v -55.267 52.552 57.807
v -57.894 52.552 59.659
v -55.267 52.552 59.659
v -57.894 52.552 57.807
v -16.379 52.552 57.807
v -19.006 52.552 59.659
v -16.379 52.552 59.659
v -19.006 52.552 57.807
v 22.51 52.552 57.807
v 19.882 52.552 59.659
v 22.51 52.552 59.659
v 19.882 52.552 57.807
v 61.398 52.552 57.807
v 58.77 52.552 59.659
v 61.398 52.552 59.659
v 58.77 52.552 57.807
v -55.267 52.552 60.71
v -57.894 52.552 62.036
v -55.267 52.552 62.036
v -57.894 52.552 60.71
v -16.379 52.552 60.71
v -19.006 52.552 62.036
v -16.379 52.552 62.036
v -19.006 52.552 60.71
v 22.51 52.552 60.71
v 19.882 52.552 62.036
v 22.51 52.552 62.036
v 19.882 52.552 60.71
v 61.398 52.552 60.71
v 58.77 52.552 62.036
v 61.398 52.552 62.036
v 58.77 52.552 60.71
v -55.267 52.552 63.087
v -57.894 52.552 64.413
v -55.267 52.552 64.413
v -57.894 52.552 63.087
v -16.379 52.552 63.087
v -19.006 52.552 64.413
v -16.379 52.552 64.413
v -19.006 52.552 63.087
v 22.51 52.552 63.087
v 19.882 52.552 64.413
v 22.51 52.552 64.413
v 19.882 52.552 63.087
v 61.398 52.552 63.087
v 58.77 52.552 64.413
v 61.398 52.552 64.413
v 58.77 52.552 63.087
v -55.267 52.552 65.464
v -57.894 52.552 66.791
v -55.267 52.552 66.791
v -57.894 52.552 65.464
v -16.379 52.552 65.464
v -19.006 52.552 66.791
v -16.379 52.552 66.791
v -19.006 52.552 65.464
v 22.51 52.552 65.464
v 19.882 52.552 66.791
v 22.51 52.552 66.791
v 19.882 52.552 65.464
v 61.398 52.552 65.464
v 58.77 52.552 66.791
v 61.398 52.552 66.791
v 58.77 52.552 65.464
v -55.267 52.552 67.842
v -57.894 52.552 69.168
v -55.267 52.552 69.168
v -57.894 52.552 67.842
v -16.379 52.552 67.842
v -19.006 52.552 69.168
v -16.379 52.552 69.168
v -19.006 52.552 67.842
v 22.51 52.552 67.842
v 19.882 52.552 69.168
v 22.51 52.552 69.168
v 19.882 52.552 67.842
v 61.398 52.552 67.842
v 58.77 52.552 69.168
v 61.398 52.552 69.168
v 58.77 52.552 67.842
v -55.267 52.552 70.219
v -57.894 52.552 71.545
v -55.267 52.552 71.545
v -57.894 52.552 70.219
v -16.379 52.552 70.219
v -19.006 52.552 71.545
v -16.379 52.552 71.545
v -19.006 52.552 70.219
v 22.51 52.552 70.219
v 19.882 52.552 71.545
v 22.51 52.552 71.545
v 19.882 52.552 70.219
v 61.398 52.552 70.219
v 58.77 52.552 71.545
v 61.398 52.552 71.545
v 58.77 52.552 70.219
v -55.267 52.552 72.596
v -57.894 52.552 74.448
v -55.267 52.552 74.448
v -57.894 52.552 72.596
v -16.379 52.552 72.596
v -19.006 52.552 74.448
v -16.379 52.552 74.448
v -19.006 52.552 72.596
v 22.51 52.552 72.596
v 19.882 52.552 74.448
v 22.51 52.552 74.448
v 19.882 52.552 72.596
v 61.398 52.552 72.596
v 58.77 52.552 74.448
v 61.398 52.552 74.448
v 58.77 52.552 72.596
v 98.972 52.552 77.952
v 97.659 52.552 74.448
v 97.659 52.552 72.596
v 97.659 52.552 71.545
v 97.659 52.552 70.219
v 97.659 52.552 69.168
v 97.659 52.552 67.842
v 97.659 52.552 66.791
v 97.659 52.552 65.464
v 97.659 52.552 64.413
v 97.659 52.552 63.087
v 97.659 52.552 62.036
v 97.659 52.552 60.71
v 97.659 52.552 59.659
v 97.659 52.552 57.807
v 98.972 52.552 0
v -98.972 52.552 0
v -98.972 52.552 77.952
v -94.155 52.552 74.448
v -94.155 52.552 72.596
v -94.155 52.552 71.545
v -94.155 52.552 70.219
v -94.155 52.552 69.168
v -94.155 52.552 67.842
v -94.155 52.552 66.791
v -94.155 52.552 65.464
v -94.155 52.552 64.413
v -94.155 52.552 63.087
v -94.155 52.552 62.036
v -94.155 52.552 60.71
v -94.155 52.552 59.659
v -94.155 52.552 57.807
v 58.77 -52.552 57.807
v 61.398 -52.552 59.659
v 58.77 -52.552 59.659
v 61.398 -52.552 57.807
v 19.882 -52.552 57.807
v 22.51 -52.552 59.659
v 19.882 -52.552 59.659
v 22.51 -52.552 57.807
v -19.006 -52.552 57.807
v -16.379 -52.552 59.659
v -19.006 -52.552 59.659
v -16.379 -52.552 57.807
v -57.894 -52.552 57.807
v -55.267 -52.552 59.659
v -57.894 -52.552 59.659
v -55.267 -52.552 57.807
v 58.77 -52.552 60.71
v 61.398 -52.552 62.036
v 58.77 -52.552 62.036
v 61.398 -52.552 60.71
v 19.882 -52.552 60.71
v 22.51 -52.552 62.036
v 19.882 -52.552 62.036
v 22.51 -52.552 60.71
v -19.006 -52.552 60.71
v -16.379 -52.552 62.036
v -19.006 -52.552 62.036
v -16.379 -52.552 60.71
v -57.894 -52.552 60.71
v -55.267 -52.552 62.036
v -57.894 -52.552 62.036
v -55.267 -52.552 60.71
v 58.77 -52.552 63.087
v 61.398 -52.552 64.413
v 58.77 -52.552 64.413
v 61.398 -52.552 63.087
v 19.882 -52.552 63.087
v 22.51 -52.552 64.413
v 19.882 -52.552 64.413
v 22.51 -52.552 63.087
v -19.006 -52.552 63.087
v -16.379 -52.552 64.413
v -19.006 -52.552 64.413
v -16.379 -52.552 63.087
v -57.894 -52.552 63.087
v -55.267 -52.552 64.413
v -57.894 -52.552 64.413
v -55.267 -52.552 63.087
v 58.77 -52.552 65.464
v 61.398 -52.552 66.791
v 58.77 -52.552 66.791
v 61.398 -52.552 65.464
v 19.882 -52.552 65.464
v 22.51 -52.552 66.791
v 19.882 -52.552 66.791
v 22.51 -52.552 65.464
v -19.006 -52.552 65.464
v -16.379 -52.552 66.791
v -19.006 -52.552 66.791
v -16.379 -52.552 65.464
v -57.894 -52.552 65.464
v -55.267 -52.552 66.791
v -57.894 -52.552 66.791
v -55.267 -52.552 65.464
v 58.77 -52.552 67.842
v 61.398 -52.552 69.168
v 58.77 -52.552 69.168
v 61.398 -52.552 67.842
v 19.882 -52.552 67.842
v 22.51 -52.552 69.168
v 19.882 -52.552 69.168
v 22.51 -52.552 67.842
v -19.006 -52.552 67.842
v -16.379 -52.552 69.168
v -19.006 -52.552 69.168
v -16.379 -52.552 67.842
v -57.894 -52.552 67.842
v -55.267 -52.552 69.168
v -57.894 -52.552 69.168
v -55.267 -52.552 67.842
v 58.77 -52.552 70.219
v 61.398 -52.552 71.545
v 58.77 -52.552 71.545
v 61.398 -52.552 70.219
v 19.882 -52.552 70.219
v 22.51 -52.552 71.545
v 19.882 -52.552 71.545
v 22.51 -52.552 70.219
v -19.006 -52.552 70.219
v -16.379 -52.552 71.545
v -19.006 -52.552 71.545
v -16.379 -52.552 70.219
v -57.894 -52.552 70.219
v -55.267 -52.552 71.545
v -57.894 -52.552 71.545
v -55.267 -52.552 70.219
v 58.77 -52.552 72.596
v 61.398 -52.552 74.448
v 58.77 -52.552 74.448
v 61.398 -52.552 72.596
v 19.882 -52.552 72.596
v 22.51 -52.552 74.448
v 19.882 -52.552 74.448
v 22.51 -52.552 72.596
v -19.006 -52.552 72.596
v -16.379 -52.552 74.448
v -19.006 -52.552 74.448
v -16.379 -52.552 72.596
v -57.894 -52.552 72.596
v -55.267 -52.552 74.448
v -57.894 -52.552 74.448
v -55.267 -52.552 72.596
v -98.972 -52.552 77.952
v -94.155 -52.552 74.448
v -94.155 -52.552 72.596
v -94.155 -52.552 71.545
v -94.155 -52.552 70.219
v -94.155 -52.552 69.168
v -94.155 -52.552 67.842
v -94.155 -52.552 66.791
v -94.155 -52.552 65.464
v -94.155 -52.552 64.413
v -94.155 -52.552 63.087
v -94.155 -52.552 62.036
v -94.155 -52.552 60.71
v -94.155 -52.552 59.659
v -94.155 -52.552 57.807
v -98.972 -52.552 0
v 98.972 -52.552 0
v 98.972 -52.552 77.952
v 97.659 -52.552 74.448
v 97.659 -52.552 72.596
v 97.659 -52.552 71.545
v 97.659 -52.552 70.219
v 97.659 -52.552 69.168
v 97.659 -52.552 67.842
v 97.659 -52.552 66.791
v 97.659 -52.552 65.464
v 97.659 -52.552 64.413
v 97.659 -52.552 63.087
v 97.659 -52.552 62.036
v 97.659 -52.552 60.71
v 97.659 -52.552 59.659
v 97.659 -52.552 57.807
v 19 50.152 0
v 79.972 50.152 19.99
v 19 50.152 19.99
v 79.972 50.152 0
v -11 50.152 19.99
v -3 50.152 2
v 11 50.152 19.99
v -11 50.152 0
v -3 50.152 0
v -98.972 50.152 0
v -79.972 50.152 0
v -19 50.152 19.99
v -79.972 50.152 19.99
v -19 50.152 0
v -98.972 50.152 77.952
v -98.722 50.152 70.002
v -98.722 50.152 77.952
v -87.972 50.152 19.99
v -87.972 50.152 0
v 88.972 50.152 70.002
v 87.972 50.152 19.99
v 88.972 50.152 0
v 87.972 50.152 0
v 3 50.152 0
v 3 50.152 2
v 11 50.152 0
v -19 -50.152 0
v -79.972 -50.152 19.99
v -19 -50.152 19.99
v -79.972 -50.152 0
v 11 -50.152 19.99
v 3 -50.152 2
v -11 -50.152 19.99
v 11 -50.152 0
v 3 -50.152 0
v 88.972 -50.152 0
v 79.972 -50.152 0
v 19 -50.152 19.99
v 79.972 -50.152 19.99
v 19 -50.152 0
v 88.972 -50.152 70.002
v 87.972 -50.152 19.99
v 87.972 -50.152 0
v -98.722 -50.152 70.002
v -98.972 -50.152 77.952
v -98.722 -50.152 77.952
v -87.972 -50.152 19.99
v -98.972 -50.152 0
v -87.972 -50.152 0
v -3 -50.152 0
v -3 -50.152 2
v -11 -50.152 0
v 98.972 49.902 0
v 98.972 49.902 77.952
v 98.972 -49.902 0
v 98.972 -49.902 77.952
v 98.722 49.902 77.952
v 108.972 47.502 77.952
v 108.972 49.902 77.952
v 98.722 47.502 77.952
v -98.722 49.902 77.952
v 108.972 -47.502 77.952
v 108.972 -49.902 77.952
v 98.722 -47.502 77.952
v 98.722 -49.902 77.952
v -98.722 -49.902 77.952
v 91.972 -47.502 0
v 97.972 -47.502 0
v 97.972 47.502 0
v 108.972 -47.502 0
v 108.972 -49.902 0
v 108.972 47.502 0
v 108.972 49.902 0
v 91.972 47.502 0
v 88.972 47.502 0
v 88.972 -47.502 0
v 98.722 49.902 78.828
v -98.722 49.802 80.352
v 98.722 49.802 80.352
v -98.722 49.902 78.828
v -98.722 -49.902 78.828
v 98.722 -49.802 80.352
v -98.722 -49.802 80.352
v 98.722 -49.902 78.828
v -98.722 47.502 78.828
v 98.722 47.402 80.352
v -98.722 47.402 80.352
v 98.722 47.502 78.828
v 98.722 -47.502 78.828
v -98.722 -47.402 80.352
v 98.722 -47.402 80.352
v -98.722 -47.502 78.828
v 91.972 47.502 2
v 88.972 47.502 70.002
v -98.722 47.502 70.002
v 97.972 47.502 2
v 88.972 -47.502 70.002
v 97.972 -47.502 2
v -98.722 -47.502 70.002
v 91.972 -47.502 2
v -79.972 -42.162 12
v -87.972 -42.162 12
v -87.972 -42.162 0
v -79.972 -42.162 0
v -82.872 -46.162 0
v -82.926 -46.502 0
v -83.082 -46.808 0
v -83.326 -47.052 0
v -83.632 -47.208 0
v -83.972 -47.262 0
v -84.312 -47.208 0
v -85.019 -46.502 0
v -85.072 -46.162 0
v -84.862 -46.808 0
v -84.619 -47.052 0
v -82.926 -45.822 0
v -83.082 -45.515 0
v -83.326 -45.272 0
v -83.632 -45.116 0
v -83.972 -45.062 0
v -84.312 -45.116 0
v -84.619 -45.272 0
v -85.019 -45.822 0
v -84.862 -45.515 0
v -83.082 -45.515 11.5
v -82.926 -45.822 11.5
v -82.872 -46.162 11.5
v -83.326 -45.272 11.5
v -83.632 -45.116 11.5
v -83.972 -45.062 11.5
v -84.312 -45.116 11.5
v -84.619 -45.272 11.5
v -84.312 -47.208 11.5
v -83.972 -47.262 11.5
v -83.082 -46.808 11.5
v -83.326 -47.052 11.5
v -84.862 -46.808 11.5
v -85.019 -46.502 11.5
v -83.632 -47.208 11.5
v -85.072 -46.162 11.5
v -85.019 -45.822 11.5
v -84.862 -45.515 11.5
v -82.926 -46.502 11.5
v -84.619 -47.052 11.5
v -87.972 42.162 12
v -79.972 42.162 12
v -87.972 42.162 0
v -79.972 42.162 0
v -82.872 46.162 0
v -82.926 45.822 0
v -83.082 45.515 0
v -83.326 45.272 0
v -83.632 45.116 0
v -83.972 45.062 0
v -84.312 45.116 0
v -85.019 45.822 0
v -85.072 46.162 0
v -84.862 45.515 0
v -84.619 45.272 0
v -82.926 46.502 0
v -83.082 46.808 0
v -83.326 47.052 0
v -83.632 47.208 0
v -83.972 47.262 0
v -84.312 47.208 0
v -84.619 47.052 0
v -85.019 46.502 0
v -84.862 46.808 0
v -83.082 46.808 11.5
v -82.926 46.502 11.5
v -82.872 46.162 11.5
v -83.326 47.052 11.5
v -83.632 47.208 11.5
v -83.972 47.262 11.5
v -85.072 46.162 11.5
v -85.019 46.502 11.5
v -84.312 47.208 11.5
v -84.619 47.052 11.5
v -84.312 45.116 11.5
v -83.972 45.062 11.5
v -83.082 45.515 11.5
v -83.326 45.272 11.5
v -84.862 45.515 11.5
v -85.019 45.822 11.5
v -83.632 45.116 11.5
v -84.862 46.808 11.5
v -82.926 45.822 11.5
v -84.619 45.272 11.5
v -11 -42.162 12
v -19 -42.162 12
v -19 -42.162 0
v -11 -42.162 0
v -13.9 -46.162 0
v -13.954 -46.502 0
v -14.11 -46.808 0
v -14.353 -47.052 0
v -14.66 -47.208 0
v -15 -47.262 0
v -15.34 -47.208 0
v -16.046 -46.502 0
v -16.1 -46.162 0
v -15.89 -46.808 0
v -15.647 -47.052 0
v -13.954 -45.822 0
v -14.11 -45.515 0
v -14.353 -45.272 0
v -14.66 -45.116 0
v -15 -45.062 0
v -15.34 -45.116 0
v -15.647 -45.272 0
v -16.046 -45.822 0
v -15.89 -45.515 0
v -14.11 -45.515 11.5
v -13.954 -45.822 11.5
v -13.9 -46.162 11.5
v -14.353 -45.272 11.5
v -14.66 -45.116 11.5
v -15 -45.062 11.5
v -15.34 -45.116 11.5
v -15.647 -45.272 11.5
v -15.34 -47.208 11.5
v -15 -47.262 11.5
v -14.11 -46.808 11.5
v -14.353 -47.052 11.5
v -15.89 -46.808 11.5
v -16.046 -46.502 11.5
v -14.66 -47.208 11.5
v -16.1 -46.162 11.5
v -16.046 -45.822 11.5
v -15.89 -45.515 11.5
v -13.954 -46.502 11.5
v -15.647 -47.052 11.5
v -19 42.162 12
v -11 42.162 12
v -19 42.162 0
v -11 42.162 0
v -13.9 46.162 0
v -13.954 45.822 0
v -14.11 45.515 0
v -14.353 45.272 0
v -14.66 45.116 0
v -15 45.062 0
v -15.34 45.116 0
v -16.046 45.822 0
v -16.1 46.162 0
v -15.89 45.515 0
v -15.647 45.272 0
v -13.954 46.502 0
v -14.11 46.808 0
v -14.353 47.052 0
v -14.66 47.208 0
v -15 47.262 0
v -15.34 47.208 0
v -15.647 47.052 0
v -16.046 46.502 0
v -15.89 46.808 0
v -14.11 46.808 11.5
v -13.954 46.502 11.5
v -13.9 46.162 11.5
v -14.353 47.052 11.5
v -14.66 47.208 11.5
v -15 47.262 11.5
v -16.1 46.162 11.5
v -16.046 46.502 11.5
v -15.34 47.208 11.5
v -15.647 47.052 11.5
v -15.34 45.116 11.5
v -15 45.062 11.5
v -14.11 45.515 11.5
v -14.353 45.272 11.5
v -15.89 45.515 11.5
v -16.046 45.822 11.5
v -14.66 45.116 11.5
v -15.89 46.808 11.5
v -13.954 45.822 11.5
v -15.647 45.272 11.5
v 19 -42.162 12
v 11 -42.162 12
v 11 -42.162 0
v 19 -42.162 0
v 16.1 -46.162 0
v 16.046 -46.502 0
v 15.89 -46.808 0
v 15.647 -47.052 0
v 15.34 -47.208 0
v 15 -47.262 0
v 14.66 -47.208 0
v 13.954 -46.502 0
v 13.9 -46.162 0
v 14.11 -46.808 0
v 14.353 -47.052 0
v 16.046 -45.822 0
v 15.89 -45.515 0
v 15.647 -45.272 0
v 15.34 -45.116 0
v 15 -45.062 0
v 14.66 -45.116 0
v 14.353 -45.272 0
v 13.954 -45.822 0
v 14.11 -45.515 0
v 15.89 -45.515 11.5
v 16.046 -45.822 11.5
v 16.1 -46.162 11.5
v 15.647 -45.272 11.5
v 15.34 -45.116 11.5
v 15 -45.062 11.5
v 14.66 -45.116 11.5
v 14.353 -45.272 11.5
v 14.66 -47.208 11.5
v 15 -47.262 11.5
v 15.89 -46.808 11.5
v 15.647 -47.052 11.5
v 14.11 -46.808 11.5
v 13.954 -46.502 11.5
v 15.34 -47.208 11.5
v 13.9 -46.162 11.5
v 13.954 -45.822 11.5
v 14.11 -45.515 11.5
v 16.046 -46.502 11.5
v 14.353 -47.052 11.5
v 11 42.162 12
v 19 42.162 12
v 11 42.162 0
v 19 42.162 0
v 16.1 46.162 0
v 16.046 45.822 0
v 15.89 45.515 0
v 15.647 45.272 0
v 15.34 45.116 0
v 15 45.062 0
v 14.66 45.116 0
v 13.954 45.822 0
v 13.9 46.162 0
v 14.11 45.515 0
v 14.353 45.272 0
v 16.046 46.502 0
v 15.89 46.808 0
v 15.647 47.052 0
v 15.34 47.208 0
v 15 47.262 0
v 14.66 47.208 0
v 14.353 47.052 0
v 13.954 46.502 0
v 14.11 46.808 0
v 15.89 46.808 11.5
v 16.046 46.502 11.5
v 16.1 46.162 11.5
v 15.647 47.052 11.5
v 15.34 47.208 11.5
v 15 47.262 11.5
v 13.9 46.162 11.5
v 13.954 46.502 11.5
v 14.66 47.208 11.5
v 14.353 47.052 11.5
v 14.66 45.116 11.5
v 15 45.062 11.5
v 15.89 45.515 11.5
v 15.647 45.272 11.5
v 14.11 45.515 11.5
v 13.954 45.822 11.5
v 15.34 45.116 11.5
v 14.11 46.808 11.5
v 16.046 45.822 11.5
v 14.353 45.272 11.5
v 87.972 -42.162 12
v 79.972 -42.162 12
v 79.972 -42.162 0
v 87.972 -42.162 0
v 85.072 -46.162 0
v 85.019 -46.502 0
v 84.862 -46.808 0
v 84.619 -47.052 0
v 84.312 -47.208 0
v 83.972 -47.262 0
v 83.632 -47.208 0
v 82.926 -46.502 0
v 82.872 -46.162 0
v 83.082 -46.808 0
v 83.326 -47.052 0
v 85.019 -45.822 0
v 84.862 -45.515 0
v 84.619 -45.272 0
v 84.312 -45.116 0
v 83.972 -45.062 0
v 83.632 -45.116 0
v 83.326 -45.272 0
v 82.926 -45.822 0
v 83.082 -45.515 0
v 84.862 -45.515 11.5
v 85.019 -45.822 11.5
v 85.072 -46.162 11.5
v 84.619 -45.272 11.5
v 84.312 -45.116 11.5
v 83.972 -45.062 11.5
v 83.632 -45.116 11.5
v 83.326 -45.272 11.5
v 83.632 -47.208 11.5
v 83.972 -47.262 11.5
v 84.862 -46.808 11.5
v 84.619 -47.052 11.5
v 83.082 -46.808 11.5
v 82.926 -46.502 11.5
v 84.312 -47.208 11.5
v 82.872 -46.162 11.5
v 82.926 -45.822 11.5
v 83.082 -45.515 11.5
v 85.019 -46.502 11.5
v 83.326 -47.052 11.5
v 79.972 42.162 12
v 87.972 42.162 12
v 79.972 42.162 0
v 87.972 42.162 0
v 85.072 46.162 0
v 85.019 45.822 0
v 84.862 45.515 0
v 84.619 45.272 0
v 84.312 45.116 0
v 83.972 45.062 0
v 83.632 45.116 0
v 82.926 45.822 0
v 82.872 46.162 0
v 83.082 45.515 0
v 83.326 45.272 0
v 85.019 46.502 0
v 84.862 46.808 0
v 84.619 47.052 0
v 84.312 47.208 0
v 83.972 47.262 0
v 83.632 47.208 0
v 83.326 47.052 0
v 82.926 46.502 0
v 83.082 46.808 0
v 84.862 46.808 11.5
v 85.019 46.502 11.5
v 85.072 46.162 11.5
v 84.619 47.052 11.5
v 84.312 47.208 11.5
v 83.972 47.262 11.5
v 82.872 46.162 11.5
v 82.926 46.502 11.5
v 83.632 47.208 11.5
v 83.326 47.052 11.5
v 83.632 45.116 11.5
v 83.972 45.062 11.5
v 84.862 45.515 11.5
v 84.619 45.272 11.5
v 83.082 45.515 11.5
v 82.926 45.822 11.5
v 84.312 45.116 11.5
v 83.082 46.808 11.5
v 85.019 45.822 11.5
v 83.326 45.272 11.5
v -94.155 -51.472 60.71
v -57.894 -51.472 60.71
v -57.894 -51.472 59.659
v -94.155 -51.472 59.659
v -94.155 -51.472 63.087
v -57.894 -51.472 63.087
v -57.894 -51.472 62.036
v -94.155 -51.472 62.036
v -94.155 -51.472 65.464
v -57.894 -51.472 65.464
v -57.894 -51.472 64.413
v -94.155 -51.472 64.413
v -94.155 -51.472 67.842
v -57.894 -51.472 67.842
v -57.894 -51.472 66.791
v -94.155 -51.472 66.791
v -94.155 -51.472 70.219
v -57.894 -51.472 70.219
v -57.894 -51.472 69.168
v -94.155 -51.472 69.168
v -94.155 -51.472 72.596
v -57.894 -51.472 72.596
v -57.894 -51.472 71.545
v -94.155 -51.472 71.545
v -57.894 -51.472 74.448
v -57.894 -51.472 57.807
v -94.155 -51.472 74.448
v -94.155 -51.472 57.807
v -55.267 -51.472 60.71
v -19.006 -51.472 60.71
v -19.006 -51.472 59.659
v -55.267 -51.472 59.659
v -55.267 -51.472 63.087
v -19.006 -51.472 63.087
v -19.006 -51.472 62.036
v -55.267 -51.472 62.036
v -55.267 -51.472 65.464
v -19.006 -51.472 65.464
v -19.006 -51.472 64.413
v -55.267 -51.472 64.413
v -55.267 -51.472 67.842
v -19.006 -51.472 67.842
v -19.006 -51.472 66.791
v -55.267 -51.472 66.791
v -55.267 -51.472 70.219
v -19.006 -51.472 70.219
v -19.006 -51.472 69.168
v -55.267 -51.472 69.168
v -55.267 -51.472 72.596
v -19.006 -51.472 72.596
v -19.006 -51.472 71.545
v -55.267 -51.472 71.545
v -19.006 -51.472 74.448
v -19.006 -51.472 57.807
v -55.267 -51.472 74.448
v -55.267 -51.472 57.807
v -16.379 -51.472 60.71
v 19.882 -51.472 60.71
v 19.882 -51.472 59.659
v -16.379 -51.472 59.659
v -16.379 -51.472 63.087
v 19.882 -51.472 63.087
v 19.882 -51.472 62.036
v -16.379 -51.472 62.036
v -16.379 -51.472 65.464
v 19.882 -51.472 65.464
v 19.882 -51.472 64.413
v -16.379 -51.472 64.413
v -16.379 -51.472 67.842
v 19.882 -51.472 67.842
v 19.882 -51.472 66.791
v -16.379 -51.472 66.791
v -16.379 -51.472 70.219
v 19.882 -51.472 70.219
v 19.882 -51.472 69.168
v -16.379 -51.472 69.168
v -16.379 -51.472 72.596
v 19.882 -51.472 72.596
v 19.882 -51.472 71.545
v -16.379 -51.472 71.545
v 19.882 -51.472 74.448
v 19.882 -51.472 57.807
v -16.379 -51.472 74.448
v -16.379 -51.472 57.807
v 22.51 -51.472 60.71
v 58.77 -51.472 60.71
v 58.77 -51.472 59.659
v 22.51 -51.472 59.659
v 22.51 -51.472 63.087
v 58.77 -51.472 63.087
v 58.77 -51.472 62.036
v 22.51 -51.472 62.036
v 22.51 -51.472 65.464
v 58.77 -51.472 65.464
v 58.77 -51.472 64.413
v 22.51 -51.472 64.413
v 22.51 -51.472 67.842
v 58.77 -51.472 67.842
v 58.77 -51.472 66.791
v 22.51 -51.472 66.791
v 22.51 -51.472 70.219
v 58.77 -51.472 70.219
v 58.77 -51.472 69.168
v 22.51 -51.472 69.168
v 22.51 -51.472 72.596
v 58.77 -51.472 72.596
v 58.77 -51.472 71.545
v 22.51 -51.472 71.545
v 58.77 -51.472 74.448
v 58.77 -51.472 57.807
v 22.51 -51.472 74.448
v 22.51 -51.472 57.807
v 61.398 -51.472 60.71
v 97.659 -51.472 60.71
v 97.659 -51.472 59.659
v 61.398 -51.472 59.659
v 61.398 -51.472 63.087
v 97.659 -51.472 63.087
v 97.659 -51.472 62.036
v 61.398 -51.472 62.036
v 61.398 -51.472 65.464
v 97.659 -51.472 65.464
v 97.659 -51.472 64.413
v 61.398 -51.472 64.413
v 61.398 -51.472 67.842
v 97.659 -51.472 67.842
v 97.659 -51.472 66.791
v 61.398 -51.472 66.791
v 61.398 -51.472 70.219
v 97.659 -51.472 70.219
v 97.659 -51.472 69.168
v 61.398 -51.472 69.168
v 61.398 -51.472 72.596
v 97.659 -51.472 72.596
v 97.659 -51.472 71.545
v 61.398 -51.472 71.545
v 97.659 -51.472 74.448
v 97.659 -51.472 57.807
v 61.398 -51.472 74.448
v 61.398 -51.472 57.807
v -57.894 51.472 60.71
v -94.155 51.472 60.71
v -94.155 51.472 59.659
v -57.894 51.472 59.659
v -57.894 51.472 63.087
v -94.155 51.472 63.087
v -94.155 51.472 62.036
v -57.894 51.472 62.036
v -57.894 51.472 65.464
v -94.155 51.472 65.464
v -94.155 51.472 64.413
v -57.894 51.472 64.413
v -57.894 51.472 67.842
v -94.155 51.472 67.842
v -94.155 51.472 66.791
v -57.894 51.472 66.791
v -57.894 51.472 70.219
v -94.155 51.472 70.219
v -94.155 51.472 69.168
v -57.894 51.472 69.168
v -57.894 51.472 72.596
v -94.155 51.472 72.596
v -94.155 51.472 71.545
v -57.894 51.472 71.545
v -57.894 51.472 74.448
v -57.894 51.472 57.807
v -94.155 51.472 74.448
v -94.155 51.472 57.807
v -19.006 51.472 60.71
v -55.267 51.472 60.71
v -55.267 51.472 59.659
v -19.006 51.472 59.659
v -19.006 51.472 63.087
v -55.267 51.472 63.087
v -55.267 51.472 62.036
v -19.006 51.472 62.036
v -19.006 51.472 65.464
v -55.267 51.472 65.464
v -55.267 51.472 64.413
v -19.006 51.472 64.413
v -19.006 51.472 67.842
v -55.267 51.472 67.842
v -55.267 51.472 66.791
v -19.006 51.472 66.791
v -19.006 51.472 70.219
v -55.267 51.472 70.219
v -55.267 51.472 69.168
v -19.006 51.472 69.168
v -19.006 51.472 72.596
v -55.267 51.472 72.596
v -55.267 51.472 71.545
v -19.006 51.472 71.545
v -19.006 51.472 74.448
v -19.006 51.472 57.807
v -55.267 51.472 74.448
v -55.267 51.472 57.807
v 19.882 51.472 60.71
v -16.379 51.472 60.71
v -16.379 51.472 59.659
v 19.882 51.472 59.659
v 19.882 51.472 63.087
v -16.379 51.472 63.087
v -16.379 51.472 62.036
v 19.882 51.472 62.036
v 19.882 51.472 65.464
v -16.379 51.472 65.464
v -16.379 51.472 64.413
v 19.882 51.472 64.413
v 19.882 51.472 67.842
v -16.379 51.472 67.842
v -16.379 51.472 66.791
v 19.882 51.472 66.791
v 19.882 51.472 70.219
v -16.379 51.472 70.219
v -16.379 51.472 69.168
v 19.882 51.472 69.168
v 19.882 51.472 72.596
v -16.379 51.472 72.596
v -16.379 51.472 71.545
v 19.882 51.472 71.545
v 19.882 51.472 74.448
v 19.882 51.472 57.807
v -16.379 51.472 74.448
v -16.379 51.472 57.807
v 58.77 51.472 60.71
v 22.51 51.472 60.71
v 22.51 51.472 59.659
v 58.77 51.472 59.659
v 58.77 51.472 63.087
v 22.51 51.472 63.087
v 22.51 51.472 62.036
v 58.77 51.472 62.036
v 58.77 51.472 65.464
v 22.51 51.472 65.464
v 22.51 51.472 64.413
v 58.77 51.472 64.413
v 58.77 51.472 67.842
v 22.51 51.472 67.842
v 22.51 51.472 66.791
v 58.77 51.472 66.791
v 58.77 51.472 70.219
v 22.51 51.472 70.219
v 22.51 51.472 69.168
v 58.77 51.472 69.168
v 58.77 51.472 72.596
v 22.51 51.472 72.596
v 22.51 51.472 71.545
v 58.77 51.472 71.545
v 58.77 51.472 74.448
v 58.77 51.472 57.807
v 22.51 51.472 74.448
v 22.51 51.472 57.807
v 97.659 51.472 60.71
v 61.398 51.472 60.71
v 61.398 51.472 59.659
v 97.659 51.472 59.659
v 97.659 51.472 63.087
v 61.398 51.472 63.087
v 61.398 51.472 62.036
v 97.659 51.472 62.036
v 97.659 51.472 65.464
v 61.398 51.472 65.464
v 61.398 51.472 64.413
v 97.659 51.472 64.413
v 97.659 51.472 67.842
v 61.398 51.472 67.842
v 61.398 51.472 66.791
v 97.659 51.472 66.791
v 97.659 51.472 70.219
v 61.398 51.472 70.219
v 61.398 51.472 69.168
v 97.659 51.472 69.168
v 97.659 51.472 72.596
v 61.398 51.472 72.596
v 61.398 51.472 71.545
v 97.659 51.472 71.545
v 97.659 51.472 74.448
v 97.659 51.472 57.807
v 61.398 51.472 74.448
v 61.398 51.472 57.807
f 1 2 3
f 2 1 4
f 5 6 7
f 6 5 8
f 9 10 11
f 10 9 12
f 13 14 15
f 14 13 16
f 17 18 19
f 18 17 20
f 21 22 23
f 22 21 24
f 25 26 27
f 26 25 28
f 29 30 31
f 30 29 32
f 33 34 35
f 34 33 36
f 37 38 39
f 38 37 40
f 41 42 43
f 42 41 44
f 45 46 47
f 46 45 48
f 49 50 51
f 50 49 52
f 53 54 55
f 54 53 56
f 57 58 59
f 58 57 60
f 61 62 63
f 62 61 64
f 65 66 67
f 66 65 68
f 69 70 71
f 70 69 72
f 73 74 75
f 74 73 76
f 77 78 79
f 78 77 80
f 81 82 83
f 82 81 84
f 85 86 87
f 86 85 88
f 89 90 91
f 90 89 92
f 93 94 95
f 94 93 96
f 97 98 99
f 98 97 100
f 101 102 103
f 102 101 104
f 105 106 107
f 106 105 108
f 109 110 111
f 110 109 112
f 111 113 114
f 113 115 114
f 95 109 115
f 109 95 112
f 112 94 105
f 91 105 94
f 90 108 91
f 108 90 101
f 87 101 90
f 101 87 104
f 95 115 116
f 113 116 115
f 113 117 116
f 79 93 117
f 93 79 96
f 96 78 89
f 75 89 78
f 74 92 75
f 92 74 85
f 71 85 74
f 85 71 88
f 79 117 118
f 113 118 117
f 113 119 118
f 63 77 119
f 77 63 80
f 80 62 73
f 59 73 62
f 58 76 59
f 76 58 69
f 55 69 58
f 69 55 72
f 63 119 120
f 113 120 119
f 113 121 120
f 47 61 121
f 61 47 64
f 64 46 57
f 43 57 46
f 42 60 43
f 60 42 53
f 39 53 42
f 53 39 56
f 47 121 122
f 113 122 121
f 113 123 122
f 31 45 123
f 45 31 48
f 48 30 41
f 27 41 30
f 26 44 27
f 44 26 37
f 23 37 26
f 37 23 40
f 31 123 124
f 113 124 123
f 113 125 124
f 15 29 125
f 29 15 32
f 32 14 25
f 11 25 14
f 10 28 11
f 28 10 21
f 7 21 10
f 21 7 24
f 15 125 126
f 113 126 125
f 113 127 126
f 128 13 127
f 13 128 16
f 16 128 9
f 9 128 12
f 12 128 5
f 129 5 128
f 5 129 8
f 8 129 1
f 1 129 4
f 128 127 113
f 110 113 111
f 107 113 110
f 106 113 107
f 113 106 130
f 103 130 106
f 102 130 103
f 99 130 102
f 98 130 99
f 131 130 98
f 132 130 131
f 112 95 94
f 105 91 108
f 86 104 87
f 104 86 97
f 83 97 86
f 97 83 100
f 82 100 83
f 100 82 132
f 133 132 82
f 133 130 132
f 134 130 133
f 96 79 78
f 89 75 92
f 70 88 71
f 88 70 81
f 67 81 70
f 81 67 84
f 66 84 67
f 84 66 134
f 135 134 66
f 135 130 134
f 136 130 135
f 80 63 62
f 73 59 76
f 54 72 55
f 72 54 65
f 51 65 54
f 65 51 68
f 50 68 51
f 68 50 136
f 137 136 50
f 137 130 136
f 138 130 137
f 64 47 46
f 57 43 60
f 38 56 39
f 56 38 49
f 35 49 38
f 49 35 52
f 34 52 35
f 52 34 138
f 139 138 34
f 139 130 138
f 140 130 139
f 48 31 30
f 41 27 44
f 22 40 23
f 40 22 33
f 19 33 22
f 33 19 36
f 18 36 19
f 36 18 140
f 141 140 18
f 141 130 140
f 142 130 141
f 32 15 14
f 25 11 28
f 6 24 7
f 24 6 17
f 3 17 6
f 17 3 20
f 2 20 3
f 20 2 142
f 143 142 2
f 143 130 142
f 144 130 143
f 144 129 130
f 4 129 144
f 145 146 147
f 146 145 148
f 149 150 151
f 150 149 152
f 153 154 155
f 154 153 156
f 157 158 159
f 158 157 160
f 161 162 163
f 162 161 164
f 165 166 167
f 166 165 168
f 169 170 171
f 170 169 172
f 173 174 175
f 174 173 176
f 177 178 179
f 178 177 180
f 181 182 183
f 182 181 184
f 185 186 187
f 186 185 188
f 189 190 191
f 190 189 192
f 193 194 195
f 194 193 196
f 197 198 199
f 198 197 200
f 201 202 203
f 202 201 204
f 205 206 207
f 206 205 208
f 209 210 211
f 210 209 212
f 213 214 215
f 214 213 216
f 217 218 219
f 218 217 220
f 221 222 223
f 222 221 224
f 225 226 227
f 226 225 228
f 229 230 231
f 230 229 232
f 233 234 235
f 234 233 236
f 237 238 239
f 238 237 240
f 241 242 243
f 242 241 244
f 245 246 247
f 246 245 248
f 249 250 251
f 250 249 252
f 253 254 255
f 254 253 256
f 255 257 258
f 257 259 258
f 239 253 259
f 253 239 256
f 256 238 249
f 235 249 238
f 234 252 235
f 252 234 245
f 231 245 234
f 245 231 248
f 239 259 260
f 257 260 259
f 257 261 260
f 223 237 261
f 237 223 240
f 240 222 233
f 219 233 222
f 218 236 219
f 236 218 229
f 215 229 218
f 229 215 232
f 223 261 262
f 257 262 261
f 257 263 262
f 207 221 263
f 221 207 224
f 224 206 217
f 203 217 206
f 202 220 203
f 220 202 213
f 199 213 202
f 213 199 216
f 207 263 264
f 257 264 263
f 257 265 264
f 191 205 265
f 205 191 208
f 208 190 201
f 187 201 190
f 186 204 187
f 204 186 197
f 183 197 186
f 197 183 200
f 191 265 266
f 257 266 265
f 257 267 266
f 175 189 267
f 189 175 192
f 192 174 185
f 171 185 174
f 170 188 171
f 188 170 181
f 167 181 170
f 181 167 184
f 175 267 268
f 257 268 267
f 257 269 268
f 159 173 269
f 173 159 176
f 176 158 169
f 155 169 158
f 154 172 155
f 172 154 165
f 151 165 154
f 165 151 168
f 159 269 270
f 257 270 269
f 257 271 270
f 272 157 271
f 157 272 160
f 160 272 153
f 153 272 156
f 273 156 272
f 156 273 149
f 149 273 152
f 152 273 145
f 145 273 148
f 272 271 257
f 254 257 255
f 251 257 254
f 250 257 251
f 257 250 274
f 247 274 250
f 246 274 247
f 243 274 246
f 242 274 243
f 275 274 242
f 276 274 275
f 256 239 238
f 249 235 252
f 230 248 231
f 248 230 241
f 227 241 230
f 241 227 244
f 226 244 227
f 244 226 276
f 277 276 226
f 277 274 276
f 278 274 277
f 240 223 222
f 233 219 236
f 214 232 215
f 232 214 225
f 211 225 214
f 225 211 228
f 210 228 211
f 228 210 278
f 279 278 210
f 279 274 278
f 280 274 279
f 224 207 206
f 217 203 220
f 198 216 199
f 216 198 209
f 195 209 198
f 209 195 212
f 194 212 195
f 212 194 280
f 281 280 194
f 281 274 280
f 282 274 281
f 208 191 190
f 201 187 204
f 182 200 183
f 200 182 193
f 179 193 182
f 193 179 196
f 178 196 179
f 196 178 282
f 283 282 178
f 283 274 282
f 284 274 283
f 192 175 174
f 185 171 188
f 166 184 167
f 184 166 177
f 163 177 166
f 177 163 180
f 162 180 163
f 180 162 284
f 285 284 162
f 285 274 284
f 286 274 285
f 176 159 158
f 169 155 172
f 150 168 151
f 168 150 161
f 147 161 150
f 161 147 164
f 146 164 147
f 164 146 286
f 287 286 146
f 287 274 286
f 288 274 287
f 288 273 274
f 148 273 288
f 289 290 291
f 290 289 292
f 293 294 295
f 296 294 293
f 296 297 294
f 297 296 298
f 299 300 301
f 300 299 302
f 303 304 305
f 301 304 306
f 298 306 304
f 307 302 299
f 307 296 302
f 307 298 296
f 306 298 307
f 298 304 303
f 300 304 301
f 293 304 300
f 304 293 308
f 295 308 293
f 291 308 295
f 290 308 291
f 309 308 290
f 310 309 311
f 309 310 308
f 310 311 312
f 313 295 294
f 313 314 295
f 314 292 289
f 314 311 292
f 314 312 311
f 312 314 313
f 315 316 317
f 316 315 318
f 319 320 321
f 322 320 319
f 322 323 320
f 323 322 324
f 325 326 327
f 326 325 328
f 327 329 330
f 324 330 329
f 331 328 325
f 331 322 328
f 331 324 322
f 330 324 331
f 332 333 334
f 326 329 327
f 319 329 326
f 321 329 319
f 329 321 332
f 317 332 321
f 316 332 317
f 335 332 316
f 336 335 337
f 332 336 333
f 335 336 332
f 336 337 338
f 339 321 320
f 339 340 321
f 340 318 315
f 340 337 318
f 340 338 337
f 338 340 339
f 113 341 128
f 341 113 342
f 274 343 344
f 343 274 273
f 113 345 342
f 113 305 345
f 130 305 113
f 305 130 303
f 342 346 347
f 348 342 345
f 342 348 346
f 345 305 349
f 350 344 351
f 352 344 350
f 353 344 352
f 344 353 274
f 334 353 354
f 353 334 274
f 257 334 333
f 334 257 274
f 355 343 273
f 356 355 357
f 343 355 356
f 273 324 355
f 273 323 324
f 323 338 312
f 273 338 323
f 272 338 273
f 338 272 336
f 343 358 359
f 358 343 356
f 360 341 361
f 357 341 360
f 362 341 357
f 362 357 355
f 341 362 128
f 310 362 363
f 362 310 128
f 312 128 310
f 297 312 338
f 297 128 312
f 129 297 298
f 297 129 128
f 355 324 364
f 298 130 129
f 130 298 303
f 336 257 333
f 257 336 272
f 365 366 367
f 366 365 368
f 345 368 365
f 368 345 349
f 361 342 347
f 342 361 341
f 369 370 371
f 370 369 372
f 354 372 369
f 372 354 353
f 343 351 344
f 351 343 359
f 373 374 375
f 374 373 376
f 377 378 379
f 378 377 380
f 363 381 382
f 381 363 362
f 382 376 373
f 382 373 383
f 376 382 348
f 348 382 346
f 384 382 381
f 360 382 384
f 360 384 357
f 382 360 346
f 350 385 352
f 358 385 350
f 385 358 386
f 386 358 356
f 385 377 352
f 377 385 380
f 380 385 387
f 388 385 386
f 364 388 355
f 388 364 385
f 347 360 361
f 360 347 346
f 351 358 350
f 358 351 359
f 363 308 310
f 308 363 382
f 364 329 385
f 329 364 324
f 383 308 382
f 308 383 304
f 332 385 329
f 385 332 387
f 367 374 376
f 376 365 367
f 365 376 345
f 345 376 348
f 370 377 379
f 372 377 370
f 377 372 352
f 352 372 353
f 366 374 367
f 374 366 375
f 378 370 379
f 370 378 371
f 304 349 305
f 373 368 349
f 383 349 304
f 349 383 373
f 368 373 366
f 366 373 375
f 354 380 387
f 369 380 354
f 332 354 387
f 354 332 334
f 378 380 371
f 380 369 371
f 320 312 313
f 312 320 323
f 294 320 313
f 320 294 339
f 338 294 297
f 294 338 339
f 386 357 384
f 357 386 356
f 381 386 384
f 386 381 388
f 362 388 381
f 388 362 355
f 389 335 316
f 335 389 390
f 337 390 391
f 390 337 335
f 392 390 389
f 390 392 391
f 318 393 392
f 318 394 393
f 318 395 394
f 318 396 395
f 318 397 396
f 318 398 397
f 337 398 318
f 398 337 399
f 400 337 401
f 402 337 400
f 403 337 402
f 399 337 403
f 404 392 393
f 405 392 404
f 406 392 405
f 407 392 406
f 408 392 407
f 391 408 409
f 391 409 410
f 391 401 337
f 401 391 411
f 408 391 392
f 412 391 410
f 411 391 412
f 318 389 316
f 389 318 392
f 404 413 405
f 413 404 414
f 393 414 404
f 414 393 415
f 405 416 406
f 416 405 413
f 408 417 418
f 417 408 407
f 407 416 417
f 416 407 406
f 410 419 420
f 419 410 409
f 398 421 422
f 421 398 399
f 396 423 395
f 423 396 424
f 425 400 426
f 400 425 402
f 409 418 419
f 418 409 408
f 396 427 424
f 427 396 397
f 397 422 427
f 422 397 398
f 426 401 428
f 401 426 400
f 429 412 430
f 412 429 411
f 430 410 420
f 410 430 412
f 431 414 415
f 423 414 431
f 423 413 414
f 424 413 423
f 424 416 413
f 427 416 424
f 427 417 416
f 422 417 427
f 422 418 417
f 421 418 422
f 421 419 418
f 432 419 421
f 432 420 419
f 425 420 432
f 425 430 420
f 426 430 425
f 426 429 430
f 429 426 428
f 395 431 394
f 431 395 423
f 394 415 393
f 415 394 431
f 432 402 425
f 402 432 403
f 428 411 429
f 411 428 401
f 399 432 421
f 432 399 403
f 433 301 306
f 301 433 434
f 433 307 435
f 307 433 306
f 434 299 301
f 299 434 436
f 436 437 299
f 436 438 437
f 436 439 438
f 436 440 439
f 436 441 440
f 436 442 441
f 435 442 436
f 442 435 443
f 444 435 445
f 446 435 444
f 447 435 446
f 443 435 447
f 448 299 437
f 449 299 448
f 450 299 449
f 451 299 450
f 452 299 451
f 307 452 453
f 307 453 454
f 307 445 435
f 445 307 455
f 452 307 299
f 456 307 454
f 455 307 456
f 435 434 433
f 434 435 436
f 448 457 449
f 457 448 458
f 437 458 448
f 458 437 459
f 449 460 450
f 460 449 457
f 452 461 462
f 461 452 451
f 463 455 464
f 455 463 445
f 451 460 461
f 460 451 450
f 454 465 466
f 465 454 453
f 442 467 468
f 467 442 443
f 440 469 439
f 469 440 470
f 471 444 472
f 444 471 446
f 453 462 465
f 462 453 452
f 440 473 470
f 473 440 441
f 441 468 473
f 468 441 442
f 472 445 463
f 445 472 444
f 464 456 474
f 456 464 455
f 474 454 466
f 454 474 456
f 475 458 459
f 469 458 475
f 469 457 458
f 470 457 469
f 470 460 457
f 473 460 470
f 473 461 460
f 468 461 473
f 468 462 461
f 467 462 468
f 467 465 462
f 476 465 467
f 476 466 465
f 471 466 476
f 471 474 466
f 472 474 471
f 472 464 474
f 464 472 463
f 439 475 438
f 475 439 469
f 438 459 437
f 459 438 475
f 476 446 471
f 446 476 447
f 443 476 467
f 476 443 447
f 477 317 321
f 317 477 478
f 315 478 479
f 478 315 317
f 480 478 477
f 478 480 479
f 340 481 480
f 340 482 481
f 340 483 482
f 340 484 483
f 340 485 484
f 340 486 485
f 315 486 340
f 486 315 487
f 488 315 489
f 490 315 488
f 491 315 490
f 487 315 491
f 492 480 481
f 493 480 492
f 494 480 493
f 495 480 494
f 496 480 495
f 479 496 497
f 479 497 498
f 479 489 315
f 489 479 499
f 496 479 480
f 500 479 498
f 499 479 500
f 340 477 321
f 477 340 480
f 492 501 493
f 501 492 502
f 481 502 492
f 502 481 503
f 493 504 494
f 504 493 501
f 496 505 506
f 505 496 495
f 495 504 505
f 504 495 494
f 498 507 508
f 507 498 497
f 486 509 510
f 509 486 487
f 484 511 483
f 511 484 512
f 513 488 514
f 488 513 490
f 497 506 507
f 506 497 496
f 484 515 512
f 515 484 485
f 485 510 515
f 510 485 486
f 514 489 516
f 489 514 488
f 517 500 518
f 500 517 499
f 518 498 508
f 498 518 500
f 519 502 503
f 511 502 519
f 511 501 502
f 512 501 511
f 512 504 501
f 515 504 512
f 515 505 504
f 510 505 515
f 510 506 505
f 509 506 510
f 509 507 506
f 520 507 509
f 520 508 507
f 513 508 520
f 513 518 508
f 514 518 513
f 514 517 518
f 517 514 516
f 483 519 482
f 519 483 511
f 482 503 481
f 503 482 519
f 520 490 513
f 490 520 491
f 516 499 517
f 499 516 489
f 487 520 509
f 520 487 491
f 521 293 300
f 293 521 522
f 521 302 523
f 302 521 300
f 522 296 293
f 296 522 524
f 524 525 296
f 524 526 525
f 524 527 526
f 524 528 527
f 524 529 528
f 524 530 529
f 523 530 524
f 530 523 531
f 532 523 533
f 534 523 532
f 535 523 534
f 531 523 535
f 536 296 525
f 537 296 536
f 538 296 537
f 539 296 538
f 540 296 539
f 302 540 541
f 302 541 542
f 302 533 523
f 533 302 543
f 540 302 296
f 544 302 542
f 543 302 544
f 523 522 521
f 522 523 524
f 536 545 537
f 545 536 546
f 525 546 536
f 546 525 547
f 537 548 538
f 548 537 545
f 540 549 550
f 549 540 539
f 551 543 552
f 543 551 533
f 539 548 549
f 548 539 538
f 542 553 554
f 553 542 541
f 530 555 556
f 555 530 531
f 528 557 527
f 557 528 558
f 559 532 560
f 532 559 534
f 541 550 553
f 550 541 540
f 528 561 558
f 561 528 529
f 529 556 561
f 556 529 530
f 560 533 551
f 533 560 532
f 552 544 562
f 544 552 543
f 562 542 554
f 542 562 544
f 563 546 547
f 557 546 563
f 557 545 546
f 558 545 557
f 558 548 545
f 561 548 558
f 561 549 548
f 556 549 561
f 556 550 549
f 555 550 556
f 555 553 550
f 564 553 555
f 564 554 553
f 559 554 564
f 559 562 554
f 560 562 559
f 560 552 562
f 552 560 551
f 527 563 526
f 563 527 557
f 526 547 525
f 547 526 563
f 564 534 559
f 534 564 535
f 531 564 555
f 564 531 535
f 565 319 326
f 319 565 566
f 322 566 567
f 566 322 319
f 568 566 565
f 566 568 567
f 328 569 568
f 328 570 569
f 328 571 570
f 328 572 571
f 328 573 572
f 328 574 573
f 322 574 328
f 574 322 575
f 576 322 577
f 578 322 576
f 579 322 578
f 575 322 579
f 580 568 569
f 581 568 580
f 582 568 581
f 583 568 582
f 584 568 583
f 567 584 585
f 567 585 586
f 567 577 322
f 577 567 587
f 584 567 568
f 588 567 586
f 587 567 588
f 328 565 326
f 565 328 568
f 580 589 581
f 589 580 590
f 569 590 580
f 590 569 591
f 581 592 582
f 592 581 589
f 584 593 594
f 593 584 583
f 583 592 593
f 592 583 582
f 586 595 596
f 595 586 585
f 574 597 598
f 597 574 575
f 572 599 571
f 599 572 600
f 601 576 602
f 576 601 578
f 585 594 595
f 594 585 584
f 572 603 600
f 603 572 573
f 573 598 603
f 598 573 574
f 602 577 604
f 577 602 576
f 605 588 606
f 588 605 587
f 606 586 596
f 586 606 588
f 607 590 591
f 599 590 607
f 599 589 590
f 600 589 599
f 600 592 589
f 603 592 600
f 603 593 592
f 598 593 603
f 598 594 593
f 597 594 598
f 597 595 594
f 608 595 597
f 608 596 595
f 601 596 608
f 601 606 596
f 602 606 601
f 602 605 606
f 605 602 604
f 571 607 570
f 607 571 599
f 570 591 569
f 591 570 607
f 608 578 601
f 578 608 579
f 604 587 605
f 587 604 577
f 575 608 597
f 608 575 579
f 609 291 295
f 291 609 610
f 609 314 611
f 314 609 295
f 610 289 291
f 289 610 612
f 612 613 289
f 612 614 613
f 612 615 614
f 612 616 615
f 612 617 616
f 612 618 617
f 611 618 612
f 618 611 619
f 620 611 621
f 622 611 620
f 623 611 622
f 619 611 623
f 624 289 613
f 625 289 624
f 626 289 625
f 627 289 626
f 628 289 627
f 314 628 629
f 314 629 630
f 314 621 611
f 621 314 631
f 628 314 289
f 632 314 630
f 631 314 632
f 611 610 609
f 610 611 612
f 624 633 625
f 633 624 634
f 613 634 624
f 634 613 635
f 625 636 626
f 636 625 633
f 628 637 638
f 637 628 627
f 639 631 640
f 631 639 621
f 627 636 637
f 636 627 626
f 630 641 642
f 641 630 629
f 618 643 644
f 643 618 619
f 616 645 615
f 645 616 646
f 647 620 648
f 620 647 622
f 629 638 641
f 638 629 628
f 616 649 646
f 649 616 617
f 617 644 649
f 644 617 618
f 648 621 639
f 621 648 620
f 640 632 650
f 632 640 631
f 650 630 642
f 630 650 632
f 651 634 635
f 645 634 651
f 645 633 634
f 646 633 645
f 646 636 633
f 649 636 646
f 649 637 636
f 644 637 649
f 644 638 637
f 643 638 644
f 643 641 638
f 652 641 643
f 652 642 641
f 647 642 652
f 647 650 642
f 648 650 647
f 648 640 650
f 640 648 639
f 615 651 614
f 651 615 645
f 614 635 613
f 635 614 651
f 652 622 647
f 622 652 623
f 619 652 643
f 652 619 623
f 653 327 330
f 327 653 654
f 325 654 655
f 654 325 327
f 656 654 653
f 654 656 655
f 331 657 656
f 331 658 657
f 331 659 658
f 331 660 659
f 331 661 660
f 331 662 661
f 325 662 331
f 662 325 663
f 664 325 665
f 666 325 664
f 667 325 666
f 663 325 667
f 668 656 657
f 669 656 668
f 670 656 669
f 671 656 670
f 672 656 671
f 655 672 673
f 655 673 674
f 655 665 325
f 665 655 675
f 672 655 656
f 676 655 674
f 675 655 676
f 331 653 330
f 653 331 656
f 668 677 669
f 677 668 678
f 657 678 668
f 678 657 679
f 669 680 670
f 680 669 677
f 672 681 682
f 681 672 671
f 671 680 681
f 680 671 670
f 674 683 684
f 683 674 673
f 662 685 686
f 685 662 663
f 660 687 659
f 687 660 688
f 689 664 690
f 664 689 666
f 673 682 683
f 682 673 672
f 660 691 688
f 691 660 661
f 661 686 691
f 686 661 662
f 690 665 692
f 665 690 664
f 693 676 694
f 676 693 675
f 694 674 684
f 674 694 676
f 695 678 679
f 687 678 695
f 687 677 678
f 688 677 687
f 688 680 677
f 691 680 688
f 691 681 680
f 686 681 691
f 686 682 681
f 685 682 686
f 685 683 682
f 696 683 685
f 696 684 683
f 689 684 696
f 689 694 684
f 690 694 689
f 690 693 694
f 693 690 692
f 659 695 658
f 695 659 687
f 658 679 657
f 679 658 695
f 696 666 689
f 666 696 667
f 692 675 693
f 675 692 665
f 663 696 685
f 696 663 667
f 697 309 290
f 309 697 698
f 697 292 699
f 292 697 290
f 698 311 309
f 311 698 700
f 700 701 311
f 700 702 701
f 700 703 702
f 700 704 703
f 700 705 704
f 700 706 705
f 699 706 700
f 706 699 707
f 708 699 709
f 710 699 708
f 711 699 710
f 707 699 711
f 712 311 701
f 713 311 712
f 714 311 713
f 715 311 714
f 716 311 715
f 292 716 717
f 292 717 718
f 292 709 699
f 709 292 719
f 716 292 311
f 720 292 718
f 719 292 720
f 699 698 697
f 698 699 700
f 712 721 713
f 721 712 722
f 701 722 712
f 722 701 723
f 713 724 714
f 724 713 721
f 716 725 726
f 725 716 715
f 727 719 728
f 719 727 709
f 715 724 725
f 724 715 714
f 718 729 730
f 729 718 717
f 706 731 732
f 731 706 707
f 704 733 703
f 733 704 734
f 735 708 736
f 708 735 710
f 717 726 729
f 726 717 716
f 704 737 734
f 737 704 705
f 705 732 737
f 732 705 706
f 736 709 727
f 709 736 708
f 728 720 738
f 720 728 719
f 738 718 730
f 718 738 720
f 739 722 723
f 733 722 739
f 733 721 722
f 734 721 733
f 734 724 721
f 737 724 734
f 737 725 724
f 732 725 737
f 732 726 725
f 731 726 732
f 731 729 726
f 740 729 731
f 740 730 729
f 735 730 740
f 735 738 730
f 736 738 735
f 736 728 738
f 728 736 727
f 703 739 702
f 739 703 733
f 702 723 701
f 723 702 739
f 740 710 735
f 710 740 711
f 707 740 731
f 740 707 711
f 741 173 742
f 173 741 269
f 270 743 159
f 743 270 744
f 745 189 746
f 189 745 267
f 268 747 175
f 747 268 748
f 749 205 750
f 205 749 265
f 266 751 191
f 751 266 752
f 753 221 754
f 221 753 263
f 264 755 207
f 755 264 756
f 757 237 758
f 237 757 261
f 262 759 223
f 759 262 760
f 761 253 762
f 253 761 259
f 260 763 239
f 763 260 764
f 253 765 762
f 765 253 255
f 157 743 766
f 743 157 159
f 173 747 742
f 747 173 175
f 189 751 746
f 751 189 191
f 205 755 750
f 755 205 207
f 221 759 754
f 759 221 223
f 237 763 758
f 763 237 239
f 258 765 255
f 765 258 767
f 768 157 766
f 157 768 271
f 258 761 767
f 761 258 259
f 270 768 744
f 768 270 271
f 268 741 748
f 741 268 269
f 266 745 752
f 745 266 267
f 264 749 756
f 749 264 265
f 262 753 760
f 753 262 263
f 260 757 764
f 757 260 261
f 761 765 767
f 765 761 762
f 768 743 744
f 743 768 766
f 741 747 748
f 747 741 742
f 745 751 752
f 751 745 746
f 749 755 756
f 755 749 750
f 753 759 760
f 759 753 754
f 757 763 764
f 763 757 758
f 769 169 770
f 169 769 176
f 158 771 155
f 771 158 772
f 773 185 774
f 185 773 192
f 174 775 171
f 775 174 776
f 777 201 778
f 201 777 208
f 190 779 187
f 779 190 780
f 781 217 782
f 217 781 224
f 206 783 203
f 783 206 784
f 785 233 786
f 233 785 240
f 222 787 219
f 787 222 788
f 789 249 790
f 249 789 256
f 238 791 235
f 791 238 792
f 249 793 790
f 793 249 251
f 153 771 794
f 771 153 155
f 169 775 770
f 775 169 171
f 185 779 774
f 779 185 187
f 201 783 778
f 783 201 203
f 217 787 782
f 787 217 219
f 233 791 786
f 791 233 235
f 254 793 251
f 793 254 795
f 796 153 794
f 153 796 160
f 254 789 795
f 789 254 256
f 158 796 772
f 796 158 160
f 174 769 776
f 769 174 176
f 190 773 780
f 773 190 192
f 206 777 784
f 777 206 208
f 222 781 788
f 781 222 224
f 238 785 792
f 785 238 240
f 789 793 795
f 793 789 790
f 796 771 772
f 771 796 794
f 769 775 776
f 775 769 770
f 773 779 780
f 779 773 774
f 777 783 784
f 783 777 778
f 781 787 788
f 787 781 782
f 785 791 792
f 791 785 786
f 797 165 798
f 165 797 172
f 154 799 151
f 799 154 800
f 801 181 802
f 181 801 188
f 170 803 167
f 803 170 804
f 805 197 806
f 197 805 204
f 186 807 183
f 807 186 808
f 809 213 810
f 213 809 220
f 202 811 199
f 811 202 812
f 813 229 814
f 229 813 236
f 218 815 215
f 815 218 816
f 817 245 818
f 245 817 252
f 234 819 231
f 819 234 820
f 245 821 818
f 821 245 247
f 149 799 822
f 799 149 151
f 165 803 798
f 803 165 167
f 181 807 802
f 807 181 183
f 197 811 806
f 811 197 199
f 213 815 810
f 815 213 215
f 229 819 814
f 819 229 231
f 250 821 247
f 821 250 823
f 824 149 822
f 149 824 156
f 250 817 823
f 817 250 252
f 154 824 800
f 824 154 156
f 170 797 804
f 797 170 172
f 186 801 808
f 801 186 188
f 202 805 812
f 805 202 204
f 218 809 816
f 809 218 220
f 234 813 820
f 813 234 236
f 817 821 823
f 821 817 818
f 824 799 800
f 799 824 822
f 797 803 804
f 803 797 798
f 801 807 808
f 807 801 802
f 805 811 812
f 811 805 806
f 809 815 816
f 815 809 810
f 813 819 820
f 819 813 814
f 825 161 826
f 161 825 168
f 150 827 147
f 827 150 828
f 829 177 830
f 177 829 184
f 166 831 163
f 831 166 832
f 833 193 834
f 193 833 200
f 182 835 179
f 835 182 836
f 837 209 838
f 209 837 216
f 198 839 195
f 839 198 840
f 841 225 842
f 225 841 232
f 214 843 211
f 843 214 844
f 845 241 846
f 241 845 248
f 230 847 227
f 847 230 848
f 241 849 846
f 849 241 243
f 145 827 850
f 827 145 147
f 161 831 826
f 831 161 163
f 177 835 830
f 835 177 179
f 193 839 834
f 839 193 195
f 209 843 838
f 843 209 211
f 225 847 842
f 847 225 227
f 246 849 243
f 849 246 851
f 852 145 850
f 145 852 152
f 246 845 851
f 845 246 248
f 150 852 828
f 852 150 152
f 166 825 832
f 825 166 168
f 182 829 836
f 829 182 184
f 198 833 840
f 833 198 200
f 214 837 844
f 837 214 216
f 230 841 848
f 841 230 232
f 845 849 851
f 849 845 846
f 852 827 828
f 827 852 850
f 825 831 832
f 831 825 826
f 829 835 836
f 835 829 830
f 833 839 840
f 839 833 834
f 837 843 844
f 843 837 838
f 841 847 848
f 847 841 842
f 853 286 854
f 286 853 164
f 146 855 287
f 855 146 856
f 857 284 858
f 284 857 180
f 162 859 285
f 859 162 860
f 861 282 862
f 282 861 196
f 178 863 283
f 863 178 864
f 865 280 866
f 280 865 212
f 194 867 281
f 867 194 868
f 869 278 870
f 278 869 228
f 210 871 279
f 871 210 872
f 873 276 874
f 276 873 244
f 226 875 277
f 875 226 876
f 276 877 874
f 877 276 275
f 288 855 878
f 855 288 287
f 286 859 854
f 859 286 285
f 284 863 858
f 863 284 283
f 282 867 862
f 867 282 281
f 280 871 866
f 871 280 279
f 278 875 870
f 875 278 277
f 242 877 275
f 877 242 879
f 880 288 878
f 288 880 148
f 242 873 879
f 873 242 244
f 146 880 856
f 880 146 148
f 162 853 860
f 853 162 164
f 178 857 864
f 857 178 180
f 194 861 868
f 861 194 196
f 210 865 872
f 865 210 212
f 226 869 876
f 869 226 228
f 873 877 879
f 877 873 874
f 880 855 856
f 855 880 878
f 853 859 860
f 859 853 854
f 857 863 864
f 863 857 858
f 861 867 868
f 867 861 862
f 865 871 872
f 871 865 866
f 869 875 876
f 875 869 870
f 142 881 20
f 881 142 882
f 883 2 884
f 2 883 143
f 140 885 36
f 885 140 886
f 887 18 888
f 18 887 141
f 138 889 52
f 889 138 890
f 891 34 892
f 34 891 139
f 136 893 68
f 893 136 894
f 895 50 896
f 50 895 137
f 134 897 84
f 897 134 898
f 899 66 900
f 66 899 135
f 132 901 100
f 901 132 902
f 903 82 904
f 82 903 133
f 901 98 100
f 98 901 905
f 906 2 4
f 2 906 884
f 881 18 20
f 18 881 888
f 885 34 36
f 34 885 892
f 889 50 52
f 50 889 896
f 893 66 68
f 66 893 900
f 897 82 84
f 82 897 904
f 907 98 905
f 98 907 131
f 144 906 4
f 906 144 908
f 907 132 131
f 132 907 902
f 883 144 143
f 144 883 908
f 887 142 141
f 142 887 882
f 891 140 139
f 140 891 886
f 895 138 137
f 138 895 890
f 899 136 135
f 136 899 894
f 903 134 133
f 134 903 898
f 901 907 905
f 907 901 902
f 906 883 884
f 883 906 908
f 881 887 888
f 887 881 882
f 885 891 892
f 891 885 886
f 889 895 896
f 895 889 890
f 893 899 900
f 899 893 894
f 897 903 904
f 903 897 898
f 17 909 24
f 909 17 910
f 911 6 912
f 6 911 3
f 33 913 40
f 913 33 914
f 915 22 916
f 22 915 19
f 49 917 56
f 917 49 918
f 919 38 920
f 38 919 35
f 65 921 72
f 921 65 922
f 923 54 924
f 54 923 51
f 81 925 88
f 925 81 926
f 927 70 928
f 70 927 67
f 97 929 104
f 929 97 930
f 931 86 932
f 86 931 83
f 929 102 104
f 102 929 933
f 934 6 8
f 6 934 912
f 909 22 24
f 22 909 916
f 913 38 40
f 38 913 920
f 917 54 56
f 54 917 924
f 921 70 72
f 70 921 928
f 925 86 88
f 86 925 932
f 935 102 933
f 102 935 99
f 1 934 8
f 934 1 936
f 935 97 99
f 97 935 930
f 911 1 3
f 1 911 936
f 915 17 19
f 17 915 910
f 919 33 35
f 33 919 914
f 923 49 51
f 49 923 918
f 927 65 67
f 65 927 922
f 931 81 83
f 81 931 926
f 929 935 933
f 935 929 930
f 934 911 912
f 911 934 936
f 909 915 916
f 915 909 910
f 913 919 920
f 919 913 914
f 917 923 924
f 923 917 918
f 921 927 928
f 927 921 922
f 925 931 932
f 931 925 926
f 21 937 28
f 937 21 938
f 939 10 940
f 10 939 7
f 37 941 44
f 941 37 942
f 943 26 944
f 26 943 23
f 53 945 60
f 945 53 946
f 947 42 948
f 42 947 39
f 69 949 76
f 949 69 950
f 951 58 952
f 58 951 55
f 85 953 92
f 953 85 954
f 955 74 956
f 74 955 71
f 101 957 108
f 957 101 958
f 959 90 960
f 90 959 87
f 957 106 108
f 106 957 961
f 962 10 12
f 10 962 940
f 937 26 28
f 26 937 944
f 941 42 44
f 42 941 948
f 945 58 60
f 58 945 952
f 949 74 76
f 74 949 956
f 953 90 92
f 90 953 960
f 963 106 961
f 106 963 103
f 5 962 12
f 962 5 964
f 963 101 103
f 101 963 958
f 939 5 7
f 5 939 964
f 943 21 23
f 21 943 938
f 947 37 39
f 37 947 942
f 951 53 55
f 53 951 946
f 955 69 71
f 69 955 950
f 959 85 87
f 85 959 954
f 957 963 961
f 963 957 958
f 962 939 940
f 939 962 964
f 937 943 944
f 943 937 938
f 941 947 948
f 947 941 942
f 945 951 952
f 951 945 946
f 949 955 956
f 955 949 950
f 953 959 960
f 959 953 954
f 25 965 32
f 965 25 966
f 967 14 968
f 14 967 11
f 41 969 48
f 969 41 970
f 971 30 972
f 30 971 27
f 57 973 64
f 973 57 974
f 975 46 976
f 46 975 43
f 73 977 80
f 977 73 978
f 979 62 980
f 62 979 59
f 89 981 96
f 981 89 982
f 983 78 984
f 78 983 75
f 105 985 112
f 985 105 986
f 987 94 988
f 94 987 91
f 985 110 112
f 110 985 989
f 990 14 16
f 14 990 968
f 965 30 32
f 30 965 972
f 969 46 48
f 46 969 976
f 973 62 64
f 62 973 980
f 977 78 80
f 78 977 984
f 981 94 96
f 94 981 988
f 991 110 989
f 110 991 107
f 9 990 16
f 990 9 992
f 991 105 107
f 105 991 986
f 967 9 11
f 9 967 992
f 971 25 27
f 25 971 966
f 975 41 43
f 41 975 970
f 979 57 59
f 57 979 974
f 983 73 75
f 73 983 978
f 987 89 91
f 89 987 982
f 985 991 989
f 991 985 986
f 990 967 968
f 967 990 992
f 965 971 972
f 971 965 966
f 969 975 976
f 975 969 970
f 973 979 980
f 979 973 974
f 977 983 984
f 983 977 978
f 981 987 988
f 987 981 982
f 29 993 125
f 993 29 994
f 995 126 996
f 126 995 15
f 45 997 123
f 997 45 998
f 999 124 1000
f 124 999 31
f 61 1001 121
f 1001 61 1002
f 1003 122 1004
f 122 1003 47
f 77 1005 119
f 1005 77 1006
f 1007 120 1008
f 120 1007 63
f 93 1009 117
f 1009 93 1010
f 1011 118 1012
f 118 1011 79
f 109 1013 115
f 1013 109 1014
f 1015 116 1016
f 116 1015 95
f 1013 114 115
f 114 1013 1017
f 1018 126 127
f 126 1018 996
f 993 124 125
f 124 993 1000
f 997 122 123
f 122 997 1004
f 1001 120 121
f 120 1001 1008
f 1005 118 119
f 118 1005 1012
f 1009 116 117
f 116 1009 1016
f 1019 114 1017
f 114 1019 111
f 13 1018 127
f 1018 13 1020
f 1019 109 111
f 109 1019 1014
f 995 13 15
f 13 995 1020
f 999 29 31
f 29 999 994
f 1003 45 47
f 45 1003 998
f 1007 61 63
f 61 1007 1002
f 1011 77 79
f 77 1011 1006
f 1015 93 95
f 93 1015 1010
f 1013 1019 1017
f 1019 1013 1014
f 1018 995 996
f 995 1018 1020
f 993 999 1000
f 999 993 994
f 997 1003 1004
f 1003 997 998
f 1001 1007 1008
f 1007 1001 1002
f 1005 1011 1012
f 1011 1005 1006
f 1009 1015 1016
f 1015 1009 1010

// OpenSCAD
// Milwaukee Road Little Joe, G scale 1-29 - print 2 of 20: body_2 - sides and ends, section 2 (print upright)
// Render (F6), export STL, print. Settings: ../../library/lj_params.scad
// Whole loco preview and notes: ../../MILW_LittleJoe_Main.scad
SCALE_SEL = "G";
LOCO_SEL = "E70";   // [E20, E21, E70, E71, E72, E73, E74, E75, E76, E77, E78, E79] the body and roof change for E20 / E21
include <../../library/lj_all.scad>
lj_plate("body_2");
